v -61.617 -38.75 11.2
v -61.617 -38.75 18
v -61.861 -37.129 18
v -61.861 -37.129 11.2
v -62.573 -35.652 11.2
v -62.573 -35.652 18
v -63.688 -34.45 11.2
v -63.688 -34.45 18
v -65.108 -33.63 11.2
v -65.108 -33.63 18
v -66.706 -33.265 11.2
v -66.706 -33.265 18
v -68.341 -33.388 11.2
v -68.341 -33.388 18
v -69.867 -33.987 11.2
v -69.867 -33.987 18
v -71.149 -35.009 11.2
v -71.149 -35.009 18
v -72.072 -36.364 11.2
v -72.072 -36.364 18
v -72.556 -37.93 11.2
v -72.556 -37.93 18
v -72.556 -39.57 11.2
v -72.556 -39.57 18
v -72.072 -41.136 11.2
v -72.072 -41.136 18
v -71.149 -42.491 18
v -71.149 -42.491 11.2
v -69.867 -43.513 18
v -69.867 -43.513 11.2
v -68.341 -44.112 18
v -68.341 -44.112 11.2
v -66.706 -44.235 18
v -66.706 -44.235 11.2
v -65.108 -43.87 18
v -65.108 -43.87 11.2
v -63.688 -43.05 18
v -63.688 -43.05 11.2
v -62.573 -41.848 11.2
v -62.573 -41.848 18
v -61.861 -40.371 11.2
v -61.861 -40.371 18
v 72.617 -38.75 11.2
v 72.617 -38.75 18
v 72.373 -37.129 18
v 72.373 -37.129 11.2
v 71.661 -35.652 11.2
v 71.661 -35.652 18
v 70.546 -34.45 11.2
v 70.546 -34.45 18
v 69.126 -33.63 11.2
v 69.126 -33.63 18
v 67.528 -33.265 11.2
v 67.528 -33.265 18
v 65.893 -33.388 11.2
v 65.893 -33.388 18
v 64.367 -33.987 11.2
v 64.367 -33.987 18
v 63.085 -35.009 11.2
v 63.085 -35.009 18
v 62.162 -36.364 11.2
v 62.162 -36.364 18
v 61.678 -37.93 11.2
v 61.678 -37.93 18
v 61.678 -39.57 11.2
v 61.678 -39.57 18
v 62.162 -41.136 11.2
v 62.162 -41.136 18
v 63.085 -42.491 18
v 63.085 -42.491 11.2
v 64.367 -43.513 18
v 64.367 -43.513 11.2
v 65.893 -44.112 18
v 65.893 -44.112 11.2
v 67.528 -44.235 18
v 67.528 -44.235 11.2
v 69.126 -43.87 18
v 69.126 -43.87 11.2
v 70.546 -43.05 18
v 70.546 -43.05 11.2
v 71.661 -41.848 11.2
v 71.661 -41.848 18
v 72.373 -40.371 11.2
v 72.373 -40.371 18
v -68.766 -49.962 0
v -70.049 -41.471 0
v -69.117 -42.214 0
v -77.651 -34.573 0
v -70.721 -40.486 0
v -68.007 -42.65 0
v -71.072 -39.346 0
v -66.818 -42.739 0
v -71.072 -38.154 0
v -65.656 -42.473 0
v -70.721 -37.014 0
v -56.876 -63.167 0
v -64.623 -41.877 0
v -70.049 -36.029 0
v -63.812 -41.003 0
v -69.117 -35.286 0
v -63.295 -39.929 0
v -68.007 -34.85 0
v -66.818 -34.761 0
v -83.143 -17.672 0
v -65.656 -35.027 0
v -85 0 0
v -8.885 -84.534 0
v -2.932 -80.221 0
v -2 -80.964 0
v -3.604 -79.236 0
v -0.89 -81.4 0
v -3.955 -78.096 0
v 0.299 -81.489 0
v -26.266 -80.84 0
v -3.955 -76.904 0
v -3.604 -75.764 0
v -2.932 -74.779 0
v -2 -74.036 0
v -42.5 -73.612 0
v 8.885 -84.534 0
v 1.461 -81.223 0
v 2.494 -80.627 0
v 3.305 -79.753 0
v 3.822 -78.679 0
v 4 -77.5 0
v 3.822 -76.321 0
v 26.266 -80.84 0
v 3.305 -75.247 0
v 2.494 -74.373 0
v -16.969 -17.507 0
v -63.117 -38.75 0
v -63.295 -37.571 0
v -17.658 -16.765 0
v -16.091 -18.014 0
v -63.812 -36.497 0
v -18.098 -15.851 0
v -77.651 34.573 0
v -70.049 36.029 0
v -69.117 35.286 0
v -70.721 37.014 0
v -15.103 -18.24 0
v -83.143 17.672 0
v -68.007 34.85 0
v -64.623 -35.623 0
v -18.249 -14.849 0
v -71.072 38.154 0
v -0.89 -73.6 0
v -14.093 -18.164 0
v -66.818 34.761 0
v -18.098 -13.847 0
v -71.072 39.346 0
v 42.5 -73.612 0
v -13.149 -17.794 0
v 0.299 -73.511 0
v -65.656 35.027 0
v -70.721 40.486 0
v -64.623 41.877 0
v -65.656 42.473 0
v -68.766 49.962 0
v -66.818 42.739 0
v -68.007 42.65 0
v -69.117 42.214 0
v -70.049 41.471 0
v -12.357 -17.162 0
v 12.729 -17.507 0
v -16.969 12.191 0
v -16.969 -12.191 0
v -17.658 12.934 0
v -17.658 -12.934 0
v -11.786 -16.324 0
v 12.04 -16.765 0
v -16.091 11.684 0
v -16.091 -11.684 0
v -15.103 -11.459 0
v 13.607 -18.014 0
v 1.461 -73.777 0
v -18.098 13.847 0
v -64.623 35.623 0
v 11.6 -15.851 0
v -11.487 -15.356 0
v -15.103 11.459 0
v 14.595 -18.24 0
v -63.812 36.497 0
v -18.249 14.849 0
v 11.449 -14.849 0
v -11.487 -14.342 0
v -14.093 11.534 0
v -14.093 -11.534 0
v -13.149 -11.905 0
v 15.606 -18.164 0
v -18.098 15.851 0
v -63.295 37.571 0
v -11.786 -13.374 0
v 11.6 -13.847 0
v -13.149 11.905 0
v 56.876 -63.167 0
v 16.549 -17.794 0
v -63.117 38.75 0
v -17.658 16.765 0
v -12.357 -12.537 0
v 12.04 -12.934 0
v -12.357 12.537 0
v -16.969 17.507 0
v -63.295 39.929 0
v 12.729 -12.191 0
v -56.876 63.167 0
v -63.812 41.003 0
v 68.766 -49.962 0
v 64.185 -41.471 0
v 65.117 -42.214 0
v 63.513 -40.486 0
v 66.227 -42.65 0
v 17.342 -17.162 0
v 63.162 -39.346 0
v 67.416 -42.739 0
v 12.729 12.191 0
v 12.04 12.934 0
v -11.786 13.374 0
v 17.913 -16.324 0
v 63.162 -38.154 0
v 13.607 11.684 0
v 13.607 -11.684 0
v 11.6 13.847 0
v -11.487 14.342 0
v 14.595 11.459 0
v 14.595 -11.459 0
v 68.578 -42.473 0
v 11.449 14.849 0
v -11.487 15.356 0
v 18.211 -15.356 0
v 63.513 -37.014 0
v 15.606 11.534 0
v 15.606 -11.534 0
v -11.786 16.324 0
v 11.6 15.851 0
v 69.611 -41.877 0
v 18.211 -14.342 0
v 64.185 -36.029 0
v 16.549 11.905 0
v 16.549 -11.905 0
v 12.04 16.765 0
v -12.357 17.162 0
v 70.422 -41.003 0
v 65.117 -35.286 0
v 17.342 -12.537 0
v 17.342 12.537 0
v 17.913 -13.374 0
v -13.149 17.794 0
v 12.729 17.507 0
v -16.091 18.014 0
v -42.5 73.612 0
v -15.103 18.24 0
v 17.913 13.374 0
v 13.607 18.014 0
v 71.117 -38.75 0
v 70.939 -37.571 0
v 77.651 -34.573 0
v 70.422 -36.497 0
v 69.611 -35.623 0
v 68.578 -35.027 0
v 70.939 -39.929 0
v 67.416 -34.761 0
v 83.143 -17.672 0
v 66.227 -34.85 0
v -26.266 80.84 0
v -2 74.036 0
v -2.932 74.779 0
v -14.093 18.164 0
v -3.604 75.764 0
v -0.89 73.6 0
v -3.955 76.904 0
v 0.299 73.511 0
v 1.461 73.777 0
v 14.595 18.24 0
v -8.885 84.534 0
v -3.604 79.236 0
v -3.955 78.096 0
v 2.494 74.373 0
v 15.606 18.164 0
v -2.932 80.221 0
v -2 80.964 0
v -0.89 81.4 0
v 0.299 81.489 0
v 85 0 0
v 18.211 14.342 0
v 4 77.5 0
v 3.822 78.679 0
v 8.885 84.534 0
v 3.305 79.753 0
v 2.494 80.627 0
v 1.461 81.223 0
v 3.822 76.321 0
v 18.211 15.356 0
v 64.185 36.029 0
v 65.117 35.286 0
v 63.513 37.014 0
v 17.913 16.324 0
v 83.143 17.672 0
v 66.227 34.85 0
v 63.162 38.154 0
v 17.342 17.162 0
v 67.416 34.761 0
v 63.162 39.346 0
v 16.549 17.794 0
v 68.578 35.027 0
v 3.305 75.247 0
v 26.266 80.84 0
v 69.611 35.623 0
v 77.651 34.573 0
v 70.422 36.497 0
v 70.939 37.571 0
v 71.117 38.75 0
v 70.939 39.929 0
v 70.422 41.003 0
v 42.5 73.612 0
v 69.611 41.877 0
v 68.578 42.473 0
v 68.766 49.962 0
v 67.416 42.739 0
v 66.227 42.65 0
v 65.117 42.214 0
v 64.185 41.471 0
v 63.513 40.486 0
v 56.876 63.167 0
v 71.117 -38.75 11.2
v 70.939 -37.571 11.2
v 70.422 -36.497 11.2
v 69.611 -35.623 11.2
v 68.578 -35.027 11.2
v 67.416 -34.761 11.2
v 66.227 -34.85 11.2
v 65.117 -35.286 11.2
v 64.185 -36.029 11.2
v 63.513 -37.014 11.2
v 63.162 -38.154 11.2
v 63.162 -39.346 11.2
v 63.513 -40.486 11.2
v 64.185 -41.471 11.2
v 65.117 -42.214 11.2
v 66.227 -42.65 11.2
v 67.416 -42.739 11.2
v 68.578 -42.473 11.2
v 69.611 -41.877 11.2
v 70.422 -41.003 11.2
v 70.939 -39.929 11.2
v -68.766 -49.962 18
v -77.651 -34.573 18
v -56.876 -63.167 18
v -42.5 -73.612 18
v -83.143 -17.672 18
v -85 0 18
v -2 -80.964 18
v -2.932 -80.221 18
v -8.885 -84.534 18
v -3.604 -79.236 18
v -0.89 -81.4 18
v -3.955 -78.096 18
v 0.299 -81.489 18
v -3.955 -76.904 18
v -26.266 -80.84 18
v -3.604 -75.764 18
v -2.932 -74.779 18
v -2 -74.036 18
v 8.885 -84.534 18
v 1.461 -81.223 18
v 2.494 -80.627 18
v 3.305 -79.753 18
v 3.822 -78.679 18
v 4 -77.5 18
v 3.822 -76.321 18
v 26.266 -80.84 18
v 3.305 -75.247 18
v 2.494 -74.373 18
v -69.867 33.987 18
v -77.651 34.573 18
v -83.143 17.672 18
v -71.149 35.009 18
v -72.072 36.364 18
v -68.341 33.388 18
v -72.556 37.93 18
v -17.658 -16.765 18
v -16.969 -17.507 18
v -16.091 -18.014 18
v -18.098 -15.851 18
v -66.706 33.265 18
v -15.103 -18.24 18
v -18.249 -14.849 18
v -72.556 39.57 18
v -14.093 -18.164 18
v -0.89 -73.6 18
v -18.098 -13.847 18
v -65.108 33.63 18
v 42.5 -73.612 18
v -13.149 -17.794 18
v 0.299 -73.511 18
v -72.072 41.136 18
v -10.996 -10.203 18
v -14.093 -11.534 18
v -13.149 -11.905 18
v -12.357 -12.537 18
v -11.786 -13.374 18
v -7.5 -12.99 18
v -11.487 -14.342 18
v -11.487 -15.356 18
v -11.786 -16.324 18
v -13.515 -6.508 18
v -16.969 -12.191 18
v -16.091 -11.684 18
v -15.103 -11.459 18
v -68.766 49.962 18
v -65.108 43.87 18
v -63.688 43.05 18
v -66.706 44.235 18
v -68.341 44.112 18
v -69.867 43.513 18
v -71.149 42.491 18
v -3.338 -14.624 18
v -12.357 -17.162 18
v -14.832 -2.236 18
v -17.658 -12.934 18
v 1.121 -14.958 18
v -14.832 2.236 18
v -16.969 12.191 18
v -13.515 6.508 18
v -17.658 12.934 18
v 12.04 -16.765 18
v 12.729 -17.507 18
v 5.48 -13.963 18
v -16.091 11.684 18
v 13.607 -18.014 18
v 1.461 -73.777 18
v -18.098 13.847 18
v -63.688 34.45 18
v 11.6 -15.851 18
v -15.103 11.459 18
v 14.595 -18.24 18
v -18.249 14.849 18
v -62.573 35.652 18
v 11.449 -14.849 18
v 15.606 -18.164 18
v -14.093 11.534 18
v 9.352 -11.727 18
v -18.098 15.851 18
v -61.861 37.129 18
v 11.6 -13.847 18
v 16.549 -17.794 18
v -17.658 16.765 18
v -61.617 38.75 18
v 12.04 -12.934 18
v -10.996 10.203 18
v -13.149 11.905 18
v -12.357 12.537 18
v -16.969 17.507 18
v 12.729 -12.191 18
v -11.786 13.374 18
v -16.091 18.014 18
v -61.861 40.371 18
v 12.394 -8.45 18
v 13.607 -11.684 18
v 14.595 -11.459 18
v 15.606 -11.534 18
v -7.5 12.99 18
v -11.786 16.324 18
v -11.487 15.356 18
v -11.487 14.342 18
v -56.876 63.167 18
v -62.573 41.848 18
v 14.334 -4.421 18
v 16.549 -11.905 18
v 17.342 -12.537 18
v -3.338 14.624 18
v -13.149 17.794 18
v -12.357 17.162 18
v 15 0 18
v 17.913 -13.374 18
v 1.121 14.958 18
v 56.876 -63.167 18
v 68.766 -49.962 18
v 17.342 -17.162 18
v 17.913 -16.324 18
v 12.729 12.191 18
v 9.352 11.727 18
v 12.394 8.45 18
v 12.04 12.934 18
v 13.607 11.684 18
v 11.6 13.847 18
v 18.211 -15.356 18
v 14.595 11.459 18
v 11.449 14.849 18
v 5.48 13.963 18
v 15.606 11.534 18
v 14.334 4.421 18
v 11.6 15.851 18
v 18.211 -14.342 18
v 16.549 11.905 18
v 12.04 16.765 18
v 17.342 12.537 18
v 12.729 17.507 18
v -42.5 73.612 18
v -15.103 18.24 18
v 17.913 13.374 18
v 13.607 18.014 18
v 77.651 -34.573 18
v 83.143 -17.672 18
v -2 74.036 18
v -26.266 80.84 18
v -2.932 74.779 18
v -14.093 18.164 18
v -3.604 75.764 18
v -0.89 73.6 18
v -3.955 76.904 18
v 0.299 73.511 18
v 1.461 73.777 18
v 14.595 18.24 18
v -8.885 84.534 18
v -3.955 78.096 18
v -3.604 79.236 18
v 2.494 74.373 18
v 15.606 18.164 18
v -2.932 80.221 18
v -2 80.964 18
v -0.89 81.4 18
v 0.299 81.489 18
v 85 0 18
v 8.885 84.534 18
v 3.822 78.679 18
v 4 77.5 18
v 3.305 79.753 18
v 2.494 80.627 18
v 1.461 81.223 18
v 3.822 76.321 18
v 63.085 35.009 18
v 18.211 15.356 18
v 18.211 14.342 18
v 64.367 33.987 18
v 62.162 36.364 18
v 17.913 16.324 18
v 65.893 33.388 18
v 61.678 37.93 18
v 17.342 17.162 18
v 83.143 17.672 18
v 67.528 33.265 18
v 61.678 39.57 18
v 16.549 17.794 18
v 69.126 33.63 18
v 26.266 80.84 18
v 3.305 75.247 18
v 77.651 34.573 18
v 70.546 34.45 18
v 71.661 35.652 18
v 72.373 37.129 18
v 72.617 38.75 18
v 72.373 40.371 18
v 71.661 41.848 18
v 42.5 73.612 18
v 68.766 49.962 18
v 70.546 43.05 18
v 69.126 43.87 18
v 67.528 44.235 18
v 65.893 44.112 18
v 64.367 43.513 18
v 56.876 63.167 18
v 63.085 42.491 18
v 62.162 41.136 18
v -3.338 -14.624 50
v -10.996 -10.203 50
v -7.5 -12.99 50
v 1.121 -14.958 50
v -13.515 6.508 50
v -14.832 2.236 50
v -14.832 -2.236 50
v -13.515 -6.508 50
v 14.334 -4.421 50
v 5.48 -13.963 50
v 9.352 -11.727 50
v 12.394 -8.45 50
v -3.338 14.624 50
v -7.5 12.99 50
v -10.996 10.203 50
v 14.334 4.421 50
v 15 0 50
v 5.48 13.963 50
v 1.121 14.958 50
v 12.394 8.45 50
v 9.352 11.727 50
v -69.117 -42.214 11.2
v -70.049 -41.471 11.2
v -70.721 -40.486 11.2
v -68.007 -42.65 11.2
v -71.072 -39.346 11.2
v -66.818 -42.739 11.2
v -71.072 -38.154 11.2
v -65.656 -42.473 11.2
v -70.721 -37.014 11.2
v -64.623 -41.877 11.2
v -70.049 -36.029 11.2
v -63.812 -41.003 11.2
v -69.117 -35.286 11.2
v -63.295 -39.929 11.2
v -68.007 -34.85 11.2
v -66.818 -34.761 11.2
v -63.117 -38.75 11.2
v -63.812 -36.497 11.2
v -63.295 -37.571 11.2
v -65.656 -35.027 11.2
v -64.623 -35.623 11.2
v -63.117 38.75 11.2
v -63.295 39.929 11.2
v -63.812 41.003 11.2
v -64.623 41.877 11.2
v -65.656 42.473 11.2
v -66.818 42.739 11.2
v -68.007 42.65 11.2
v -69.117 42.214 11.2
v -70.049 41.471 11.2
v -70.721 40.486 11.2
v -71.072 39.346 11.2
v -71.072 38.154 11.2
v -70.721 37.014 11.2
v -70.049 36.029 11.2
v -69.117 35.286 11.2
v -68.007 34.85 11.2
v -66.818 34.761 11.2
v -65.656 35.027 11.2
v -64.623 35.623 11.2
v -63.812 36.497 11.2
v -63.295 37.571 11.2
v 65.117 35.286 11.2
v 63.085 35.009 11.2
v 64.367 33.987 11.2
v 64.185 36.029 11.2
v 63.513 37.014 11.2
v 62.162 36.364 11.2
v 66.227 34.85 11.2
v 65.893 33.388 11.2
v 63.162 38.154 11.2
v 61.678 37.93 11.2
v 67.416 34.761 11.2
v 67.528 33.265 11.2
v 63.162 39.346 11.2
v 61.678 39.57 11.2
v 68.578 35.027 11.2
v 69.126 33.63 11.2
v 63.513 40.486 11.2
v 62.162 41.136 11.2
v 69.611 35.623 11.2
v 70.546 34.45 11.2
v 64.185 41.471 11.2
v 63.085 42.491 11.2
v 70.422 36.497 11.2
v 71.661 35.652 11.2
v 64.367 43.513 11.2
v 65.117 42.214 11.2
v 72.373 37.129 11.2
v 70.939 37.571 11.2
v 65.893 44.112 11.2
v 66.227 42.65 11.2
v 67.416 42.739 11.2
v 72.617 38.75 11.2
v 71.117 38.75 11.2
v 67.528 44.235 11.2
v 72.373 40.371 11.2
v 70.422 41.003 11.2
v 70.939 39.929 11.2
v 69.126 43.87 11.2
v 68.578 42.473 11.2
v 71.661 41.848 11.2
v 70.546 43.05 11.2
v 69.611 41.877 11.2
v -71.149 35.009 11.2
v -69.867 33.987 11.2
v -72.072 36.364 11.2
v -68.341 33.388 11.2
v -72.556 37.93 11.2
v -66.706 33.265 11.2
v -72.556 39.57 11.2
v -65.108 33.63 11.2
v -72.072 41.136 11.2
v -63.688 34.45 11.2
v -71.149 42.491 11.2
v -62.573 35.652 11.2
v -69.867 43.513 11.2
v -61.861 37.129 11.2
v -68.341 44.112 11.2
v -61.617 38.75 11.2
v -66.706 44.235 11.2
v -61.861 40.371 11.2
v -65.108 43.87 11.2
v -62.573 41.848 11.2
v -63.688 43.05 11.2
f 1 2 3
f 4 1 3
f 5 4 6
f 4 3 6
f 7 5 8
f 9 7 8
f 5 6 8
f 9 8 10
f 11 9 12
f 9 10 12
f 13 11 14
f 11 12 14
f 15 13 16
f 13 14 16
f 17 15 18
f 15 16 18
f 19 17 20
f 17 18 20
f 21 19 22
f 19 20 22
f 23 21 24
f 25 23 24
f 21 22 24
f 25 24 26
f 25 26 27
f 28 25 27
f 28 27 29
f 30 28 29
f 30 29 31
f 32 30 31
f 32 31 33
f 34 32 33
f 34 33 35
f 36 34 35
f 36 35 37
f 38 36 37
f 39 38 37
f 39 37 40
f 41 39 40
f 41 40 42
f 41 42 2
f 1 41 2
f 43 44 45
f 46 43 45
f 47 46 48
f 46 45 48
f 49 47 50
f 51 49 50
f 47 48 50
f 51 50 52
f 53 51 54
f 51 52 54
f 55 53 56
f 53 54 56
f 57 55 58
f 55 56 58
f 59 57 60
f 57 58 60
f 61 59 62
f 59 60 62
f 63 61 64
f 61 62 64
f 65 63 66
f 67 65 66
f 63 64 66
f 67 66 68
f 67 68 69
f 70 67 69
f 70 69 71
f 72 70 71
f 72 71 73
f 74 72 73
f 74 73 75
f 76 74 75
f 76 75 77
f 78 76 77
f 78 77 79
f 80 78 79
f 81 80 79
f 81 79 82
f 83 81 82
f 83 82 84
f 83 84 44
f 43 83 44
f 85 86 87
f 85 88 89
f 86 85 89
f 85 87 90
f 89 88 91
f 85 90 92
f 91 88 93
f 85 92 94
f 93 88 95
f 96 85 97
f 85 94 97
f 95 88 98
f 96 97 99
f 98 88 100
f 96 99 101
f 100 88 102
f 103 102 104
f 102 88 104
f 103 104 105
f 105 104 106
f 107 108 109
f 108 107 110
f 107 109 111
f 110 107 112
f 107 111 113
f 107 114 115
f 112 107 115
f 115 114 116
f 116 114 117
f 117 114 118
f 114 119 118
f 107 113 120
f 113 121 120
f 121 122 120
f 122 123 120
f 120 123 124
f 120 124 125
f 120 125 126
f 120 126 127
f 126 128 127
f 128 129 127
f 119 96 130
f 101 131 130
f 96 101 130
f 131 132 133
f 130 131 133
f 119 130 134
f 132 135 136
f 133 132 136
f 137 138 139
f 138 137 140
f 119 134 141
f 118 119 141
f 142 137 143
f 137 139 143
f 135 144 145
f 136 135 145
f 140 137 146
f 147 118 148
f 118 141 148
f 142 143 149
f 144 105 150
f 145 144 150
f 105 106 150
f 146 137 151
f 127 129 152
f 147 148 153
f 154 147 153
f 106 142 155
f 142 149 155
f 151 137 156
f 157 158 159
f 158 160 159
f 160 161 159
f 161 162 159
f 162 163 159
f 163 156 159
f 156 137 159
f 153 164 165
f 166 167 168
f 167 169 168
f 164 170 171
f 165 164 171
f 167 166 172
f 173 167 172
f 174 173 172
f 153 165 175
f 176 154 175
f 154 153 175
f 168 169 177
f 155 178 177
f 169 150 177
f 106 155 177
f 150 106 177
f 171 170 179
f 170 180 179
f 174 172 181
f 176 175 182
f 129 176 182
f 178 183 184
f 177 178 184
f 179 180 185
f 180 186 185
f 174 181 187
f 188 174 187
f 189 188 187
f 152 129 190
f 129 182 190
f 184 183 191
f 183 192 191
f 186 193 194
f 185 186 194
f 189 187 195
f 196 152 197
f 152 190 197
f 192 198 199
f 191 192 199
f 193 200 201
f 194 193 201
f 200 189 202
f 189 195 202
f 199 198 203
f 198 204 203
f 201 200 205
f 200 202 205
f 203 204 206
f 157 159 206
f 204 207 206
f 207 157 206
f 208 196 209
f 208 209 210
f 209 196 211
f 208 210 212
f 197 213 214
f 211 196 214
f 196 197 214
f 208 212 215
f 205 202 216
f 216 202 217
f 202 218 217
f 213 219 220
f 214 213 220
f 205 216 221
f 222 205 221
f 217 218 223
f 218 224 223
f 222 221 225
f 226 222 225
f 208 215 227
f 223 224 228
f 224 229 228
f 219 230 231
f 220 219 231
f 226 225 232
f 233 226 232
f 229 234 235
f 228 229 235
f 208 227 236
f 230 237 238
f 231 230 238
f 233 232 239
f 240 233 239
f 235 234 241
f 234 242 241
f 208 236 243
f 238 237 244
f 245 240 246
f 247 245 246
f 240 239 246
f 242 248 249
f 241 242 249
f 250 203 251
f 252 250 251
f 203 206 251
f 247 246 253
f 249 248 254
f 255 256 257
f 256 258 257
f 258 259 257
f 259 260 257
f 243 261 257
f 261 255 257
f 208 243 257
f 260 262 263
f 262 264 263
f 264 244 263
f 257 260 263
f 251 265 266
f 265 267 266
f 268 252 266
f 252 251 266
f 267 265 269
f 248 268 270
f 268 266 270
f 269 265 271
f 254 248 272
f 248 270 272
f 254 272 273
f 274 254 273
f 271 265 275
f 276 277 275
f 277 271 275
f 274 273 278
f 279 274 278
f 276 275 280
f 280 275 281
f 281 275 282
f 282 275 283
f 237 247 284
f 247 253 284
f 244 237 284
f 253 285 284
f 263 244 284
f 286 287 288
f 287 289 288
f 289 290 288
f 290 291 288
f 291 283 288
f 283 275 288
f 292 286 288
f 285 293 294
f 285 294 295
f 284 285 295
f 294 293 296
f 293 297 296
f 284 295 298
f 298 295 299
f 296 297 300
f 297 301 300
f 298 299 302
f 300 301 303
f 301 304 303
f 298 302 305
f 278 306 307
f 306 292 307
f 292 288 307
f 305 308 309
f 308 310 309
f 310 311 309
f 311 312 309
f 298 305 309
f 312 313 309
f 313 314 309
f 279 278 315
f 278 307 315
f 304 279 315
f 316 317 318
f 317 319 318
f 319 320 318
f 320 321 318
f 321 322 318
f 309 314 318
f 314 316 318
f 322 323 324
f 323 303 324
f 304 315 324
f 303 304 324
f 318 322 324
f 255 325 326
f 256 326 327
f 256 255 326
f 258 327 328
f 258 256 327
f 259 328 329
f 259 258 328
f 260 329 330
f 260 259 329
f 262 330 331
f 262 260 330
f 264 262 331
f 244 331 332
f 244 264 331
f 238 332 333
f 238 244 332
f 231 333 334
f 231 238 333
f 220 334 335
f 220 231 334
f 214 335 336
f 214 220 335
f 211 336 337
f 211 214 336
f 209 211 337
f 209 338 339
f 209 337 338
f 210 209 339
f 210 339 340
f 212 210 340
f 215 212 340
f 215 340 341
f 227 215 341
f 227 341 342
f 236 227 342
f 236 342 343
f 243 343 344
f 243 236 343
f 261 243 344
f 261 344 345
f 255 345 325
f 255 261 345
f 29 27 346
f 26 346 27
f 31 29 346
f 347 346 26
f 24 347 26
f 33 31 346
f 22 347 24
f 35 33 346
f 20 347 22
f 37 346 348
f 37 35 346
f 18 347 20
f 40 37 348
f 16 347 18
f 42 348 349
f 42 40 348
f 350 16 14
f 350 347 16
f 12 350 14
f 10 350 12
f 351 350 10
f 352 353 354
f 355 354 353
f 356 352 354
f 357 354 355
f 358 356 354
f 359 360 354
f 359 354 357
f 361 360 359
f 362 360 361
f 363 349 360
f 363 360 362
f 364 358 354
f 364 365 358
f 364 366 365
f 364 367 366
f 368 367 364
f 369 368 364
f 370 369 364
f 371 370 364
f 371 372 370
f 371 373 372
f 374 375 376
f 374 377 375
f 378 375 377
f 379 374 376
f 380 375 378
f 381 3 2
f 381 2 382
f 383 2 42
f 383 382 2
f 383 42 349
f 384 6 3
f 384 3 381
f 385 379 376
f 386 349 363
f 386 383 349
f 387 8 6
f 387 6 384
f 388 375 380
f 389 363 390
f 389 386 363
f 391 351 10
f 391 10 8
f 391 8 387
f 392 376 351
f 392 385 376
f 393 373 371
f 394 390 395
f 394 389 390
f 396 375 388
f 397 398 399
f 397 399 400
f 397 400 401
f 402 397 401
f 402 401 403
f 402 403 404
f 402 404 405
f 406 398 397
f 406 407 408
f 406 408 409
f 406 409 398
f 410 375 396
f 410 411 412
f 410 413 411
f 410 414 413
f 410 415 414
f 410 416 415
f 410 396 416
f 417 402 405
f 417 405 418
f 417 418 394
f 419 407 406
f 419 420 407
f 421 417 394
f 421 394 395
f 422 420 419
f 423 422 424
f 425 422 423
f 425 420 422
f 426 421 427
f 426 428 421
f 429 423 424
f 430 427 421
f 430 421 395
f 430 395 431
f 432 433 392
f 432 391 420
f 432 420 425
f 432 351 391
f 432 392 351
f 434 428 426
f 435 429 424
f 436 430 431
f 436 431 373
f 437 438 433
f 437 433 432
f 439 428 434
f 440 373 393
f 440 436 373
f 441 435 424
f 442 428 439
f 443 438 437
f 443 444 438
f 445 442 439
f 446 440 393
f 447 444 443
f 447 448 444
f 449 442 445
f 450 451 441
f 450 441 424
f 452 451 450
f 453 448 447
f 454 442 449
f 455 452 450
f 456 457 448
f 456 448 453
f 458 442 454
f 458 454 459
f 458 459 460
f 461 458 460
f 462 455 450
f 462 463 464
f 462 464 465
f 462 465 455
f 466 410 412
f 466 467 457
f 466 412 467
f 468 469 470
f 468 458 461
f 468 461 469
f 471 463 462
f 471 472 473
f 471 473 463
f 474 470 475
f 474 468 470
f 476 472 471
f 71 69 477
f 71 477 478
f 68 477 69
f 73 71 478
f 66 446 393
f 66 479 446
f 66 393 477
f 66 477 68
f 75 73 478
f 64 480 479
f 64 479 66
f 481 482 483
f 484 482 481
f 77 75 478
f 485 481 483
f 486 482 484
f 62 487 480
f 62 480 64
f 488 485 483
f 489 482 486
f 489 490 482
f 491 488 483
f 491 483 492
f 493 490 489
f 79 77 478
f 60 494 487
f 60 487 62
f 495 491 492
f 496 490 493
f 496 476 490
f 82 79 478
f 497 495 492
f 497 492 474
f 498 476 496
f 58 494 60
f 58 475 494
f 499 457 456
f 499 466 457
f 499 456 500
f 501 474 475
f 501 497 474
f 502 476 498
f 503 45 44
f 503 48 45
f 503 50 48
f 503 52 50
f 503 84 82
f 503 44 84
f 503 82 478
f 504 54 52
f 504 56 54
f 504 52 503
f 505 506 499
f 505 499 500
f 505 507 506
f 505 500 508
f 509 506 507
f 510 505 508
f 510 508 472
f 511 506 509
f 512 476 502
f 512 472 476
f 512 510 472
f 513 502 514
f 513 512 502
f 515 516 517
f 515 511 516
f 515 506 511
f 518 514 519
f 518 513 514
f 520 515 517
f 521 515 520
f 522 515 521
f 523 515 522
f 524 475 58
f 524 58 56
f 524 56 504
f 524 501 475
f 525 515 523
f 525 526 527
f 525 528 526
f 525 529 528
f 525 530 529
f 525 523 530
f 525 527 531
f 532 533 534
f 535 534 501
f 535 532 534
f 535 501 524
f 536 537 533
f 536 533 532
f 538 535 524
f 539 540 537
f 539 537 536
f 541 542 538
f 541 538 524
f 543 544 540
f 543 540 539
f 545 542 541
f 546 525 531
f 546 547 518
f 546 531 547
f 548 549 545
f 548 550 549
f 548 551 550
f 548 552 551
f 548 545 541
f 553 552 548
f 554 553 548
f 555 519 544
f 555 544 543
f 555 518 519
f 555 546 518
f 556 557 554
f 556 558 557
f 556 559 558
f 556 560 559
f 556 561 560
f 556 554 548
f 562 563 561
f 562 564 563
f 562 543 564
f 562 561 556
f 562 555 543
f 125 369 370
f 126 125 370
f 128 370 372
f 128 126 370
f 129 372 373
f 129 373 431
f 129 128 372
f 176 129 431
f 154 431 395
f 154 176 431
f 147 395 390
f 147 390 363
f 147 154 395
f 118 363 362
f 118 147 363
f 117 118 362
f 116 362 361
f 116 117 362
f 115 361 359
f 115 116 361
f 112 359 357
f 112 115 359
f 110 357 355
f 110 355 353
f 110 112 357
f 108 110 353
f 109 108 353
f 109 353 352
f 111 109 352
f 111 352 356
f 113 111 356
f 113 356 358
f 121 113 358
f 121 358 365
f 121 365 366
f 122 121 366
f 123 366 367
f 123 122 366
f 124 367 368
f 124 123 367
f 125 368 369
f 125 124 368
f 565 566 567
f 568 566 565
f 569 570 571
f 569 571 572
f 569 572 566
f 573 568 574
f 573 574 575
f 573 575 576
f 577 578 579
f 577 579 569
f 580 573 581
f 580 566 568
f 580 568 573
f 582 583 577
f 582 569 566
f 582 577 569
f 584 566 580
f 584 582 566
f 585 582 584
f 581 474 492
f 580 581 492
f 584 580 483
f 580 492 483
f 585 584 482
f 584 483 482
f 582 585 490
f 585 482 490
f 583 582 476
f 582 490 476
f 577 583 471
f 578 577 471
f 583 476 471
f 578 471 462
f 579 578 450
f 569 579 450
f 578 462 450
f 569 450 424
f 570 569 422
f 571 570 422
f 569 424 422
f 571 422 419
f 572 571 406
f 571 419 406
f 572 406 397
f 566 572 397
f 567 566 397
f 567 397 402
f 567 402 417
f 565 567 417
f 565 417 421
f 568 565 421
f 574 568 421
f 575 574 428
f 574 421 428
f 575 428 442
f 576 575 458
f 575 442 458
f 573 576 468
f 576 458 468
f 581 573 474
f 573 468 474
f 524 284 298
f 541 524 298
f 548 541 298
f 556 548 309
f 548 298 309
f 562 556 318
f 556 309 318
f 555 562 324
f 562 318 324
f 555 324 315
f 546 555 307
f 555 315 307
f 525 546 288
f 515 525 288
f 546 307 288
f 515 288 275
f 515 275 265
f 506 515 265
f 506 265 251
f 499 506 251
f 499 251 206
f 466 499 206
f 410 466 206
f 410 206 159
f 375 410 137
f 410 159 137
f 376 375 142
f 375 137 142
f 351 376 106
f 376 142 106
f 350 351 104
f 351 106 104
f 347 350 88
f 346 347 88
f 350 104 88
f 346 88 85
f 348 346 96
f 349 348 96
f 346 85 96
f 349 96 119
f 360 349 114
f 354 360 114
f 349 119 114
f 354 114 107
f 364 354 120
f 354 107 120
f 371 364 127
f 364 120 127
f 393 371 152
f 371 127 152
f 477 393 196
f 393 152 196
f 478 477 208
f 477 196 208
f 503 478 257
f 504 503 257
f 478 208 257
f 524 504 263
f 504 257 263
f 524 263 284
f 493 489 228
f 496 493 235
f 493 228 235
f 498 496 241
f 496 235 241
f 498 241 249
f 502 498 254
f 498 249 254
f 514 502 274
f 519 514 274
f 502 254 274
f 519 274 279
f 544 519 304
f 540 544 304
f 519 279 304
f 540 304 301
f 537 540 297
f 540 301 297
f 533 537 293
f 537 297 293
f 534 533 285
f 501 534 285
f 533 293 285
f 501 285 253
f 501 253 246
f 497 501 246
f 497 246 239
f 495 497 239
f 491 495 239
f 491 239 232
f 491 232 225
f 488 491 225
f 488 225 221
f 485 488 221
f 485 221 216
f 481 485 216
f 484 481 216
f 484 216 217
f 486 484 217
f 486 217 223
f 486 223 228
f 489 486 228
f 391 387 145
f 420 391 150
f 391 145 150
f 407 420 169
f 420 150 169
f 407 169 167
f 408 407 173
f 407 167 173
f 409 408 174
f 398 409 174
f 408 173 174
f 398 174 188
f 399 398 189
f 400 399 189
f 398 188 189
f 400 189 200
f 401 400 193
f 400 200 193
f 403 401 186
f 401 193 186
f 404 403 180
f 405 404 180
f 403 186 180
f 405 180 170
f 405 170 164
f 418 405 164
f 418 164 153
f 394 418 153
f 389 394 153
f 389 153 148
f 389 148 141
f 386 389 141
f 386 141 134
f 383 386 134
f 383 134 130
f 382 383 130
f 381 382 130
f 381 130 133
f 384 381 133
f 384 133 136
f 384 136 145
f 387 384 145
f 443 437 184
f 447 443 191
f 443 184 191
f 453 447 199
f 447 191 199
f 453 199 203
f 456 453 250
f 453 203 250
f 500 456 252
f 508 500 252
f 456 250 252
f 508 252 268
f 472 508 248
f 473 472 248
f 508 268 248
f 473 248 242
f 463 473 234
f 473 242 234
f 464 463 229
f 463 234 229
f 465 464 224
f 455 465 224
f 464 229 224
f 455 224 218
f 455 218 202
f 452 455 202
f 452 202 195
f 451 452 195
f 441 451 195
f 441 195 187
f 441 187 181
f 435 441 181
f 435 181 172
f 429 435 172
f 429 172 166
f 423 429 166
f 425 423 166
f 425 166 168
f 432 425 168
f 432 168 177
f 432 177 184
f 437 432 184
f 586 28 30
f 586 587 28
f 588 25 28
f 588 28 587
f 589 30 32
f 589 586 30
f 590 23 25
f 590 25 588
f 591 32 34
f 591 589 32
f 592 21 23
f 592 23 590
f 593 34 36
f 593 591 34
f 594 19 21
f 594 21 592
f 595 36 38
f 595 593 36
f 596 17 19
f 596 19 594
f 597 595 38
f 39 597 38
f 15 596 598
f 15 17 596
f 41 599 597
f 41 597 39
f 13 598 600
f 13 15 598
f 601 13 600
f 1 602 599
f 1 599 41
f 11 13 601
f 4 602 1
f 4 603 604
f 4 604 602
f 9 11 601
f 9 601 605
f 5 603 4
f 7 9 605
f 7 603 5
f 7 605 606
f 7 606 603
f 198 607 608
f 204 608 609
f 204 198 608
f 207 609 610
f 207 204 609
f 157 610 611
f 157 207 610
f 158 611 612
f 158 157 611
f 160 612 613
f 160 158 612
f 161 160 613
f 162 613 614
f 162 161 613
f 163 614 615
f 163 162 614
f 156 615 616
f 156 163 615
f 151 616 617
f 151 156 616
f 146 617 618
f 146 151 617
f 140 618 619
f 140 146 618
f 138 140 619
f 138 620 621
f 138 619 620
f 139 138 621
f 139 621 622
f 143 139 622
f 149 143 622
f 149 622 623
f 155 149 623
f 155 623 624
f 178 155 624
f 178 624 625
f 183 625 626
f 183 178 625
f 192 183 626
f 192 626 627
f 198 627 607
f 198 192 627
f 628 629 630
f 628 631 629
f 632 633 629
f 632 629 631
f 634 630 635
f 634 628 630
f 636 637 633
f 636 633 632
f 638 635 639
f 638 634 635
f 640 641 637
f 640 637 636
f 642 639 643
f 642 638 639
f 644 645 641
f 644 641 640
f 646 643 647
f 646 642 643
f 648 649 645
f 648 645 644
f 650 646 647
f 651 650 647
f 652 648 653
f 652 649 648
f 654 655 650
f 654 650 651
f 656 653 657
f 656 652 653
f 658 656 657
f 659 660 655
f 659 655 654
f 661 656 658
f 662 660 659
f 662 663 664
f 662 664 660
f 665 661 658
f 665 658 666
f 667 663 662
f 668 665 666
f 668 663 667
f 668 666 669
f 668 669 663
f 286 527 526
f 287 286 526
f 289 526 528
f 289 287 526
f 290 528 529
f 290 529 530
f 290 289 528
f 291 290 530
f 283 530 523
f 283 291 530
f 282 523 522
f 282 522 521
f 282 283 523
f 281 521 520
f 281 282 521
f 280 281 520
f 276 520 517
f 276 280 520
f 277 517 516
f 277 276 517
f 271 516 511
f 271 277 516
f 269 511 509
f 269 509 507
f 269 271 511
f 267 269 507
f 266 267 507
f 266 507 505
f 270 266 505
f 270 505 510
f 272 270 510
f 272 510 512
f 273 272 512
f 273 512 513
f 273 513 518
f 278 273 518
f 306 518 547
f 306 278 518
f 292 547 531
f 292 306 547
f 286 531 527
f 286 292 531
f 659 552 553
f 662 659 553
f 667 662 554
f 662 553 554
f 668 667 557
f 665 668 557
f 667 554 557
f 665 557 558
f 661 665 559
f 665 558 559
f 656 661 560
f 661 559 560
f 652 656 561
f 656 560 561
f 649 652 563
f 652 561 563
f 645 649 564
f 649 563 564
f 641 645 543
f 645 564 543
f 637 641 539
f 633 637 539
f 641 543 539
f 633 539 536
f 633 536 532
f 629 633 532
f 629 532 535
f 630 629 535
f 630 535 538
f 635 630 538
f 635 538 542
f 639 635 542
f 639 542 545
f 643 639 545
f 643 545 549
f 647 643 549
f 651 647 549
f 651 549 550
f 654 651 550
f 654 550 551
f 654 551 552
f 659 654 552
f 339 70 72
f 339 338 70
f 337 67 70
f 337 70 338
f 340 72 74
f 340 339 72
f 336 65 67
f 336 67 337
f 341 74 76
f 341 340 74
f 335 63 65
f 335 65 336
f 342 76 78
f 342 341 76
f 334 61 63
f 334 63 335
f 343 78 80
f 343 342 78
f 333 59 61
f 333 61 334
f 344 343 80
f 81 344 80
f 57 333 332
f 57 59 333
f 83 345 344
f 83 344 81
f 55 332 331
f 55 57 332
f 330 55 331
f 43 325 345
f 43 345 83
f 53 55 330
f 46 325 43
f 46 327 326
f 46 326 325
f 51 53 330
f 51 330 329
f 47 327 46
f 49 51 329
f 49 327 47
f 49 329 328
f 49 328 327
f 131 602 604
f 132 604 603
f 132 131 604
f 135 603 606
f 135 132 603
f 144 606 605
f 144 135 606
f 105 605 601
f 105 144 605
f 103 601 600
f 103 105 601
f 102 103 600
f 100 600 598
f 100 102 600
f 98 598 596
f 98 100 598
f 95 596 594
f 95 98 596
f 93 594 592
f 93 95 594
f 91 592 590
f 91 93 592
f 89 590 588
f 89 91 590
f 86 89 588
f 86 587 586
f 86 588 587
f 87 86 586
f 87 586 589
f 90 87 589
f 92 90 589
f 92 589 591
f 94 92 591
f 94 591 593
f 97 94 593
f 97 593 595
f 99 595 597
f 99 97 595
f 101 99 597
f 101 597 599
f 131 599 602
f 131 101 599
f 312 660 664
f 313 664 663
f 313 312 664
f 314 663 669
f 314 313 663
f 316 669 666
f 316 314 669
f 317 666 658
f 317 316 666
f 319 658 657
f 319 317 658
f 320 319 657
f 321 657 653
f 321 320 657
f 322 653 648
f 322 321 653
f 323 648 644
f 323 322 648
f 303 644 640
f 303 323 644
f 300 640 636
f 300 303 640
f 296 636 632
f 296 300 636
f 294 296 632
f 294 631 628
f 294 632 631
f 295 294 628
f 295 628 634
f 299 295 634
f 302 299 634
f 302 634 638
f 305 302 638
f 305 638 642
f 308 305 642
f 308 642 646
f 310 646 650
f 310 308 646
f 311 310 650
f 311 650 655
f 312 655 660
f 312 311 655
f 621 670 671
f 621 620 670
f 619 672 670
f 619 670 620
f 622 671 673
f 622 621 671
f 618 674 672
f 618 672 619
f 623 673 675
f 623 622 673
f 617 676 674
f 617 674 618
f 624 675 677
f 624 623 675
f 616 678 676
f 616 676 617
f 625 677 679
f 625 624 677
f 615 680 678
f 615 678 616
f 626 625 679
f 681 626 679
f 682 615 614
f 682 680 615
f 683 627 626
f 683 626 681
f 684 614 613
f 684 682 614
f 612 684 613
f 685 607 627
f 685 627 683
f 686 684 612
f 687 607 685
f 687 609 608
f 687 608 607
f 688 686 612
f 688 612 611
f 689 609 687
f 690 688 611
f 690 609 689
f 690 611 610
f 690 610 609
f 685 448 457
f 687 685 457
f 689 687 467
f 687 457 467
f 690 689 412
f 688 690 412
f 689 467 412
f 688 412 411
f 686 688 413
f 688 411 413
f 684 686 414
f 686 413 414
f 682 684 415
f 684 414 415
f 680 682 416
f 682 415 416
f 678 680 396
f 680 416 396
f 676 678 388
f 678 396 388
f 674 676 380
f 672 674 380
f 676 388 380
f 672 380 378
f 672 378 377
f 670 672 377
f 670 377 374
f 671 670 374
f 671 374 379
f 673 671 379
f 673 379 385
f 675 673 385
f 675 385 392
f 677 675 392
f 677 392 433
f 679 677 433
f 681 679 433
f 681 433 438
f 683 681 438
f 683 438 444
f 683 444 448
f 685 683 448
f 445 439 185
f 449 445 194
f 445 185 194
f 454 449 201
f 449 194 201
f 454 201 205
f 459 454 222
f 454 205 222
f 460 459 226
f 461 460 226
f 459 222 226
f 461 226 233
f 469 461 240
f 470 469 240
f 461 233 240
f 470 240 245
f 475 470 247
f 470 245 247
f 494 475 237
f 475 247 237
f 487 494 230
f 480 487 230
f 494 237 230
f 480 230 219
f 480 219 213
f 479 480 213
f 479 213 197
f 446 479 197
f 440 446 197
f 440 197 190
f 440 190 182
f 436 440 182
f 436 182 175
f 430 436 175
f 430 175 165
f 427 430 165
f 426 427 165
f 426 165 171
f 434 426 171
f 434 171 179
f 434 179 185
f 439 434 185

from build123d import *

# Parameters (mm, degrees)
SKETCH_1_R                = 85
SKETCH_1_R_2              = 4
SKETCH_1_R_3              = 3
EXTRUDE_1_DEPTH           = 18
HOLE_WIZARD_1_D           = 6.6
HOLE_WIZARD_1_CBORE_D     = 11
HOLE_WIZARD_1_CBORE_DEPTH = 6.8
HOLE_WIZARD_M8_1_D        = 6.8
SKETCH_6_R                = 15
EXTRUDE_2_DEPTH           = 32


with BuildPart() as part:
    # 草图1 → 凸台-拉伸1 (new body)
    with BuildSketch(Plane.XY):
        Circle(SKETCH_1_R)
        with Locations((0, 77.5)):
            Circle(SKETCH_1_R_2, mode=Mode.SUBTRACT)
        with Locations((67.116968793, 38.75)):
            Circle(SKETCH_1_R_2, mode=Mode.SUBTRACT)
        with Locations((67.116968793, -38.75)):
            Circle(SKETCH_1_R_2, mode=Mode.SUBTRACT)
        with Locations((0, -77.5)):
            Circle(SKETCH_1_R_2, mode=Mode.SUBTRACT)
        with Locations((-67.116968793, -38.75)):
            Circle(SKETCH_1_R_2, mode=Mode.SUBTRACT)
        with Locations((-67.116968793, 38.75)):
            Circle(SKETCH_1_R_2, mode=Mode.SUBTRACT)
        with Locations((-14.849242405, 14.849242405)):
            Circle(SKETCH_1_R_3, mode=Mode.SUBTRACT)
        with Locations((14.849242405, 14.849242405)):
            Circle(SKETCH_1_R_3, mode=Mode.SUBTRACT)
        with Locations((14.849242405, -14.849242405)):
            Circle(SKETCH_1_R_3, mode=Mode.SUBTRACT)
        with Locations((-14.849242405, -14.849242405)):
            Circle(SKETCH_1_R_3, mode=Mode.SUBTRACT)
    extrude(amount=EXTRUDE_1_DEPTH)

    # 打孔尺寸(%根据)内六角圆柱头螺钉的类型1 (through all)
    with Locations(Plane.XY.offset(18)):
        with Locations((-67.116968793, 38.75), (67.116968793, 38.75), (67.116968793, -38.75), (-67.116968793, -38.75)):
            CounterBoreHole(HOLE_WIZARD_1_D / 2, HOLE_WIZARD_1_CBORE_D / 2, HOLE_WIZARD_1_CBORE_DEPTH)

    # M8 螺纹孔1 (through all)
    with Locations(Plane.XY.offset(18)):
        with Locations((-14.849242405, 14.849242405), (14.849242405, 14.849242405), (14.849242405, -14.849242405), (-14.849242405, -14.849242405)):
            Hole(HOLE_WIZARD_M8_1_D / 2)

    # 草图6 → 凸台-拉伸2 (add)
    with BuildSketch(Plane.XY.offset(18)):
        Circle(SKETCH_6_R)
    extrude(amount=EXTRUDE_2_DEPTH)


solid = part.part
